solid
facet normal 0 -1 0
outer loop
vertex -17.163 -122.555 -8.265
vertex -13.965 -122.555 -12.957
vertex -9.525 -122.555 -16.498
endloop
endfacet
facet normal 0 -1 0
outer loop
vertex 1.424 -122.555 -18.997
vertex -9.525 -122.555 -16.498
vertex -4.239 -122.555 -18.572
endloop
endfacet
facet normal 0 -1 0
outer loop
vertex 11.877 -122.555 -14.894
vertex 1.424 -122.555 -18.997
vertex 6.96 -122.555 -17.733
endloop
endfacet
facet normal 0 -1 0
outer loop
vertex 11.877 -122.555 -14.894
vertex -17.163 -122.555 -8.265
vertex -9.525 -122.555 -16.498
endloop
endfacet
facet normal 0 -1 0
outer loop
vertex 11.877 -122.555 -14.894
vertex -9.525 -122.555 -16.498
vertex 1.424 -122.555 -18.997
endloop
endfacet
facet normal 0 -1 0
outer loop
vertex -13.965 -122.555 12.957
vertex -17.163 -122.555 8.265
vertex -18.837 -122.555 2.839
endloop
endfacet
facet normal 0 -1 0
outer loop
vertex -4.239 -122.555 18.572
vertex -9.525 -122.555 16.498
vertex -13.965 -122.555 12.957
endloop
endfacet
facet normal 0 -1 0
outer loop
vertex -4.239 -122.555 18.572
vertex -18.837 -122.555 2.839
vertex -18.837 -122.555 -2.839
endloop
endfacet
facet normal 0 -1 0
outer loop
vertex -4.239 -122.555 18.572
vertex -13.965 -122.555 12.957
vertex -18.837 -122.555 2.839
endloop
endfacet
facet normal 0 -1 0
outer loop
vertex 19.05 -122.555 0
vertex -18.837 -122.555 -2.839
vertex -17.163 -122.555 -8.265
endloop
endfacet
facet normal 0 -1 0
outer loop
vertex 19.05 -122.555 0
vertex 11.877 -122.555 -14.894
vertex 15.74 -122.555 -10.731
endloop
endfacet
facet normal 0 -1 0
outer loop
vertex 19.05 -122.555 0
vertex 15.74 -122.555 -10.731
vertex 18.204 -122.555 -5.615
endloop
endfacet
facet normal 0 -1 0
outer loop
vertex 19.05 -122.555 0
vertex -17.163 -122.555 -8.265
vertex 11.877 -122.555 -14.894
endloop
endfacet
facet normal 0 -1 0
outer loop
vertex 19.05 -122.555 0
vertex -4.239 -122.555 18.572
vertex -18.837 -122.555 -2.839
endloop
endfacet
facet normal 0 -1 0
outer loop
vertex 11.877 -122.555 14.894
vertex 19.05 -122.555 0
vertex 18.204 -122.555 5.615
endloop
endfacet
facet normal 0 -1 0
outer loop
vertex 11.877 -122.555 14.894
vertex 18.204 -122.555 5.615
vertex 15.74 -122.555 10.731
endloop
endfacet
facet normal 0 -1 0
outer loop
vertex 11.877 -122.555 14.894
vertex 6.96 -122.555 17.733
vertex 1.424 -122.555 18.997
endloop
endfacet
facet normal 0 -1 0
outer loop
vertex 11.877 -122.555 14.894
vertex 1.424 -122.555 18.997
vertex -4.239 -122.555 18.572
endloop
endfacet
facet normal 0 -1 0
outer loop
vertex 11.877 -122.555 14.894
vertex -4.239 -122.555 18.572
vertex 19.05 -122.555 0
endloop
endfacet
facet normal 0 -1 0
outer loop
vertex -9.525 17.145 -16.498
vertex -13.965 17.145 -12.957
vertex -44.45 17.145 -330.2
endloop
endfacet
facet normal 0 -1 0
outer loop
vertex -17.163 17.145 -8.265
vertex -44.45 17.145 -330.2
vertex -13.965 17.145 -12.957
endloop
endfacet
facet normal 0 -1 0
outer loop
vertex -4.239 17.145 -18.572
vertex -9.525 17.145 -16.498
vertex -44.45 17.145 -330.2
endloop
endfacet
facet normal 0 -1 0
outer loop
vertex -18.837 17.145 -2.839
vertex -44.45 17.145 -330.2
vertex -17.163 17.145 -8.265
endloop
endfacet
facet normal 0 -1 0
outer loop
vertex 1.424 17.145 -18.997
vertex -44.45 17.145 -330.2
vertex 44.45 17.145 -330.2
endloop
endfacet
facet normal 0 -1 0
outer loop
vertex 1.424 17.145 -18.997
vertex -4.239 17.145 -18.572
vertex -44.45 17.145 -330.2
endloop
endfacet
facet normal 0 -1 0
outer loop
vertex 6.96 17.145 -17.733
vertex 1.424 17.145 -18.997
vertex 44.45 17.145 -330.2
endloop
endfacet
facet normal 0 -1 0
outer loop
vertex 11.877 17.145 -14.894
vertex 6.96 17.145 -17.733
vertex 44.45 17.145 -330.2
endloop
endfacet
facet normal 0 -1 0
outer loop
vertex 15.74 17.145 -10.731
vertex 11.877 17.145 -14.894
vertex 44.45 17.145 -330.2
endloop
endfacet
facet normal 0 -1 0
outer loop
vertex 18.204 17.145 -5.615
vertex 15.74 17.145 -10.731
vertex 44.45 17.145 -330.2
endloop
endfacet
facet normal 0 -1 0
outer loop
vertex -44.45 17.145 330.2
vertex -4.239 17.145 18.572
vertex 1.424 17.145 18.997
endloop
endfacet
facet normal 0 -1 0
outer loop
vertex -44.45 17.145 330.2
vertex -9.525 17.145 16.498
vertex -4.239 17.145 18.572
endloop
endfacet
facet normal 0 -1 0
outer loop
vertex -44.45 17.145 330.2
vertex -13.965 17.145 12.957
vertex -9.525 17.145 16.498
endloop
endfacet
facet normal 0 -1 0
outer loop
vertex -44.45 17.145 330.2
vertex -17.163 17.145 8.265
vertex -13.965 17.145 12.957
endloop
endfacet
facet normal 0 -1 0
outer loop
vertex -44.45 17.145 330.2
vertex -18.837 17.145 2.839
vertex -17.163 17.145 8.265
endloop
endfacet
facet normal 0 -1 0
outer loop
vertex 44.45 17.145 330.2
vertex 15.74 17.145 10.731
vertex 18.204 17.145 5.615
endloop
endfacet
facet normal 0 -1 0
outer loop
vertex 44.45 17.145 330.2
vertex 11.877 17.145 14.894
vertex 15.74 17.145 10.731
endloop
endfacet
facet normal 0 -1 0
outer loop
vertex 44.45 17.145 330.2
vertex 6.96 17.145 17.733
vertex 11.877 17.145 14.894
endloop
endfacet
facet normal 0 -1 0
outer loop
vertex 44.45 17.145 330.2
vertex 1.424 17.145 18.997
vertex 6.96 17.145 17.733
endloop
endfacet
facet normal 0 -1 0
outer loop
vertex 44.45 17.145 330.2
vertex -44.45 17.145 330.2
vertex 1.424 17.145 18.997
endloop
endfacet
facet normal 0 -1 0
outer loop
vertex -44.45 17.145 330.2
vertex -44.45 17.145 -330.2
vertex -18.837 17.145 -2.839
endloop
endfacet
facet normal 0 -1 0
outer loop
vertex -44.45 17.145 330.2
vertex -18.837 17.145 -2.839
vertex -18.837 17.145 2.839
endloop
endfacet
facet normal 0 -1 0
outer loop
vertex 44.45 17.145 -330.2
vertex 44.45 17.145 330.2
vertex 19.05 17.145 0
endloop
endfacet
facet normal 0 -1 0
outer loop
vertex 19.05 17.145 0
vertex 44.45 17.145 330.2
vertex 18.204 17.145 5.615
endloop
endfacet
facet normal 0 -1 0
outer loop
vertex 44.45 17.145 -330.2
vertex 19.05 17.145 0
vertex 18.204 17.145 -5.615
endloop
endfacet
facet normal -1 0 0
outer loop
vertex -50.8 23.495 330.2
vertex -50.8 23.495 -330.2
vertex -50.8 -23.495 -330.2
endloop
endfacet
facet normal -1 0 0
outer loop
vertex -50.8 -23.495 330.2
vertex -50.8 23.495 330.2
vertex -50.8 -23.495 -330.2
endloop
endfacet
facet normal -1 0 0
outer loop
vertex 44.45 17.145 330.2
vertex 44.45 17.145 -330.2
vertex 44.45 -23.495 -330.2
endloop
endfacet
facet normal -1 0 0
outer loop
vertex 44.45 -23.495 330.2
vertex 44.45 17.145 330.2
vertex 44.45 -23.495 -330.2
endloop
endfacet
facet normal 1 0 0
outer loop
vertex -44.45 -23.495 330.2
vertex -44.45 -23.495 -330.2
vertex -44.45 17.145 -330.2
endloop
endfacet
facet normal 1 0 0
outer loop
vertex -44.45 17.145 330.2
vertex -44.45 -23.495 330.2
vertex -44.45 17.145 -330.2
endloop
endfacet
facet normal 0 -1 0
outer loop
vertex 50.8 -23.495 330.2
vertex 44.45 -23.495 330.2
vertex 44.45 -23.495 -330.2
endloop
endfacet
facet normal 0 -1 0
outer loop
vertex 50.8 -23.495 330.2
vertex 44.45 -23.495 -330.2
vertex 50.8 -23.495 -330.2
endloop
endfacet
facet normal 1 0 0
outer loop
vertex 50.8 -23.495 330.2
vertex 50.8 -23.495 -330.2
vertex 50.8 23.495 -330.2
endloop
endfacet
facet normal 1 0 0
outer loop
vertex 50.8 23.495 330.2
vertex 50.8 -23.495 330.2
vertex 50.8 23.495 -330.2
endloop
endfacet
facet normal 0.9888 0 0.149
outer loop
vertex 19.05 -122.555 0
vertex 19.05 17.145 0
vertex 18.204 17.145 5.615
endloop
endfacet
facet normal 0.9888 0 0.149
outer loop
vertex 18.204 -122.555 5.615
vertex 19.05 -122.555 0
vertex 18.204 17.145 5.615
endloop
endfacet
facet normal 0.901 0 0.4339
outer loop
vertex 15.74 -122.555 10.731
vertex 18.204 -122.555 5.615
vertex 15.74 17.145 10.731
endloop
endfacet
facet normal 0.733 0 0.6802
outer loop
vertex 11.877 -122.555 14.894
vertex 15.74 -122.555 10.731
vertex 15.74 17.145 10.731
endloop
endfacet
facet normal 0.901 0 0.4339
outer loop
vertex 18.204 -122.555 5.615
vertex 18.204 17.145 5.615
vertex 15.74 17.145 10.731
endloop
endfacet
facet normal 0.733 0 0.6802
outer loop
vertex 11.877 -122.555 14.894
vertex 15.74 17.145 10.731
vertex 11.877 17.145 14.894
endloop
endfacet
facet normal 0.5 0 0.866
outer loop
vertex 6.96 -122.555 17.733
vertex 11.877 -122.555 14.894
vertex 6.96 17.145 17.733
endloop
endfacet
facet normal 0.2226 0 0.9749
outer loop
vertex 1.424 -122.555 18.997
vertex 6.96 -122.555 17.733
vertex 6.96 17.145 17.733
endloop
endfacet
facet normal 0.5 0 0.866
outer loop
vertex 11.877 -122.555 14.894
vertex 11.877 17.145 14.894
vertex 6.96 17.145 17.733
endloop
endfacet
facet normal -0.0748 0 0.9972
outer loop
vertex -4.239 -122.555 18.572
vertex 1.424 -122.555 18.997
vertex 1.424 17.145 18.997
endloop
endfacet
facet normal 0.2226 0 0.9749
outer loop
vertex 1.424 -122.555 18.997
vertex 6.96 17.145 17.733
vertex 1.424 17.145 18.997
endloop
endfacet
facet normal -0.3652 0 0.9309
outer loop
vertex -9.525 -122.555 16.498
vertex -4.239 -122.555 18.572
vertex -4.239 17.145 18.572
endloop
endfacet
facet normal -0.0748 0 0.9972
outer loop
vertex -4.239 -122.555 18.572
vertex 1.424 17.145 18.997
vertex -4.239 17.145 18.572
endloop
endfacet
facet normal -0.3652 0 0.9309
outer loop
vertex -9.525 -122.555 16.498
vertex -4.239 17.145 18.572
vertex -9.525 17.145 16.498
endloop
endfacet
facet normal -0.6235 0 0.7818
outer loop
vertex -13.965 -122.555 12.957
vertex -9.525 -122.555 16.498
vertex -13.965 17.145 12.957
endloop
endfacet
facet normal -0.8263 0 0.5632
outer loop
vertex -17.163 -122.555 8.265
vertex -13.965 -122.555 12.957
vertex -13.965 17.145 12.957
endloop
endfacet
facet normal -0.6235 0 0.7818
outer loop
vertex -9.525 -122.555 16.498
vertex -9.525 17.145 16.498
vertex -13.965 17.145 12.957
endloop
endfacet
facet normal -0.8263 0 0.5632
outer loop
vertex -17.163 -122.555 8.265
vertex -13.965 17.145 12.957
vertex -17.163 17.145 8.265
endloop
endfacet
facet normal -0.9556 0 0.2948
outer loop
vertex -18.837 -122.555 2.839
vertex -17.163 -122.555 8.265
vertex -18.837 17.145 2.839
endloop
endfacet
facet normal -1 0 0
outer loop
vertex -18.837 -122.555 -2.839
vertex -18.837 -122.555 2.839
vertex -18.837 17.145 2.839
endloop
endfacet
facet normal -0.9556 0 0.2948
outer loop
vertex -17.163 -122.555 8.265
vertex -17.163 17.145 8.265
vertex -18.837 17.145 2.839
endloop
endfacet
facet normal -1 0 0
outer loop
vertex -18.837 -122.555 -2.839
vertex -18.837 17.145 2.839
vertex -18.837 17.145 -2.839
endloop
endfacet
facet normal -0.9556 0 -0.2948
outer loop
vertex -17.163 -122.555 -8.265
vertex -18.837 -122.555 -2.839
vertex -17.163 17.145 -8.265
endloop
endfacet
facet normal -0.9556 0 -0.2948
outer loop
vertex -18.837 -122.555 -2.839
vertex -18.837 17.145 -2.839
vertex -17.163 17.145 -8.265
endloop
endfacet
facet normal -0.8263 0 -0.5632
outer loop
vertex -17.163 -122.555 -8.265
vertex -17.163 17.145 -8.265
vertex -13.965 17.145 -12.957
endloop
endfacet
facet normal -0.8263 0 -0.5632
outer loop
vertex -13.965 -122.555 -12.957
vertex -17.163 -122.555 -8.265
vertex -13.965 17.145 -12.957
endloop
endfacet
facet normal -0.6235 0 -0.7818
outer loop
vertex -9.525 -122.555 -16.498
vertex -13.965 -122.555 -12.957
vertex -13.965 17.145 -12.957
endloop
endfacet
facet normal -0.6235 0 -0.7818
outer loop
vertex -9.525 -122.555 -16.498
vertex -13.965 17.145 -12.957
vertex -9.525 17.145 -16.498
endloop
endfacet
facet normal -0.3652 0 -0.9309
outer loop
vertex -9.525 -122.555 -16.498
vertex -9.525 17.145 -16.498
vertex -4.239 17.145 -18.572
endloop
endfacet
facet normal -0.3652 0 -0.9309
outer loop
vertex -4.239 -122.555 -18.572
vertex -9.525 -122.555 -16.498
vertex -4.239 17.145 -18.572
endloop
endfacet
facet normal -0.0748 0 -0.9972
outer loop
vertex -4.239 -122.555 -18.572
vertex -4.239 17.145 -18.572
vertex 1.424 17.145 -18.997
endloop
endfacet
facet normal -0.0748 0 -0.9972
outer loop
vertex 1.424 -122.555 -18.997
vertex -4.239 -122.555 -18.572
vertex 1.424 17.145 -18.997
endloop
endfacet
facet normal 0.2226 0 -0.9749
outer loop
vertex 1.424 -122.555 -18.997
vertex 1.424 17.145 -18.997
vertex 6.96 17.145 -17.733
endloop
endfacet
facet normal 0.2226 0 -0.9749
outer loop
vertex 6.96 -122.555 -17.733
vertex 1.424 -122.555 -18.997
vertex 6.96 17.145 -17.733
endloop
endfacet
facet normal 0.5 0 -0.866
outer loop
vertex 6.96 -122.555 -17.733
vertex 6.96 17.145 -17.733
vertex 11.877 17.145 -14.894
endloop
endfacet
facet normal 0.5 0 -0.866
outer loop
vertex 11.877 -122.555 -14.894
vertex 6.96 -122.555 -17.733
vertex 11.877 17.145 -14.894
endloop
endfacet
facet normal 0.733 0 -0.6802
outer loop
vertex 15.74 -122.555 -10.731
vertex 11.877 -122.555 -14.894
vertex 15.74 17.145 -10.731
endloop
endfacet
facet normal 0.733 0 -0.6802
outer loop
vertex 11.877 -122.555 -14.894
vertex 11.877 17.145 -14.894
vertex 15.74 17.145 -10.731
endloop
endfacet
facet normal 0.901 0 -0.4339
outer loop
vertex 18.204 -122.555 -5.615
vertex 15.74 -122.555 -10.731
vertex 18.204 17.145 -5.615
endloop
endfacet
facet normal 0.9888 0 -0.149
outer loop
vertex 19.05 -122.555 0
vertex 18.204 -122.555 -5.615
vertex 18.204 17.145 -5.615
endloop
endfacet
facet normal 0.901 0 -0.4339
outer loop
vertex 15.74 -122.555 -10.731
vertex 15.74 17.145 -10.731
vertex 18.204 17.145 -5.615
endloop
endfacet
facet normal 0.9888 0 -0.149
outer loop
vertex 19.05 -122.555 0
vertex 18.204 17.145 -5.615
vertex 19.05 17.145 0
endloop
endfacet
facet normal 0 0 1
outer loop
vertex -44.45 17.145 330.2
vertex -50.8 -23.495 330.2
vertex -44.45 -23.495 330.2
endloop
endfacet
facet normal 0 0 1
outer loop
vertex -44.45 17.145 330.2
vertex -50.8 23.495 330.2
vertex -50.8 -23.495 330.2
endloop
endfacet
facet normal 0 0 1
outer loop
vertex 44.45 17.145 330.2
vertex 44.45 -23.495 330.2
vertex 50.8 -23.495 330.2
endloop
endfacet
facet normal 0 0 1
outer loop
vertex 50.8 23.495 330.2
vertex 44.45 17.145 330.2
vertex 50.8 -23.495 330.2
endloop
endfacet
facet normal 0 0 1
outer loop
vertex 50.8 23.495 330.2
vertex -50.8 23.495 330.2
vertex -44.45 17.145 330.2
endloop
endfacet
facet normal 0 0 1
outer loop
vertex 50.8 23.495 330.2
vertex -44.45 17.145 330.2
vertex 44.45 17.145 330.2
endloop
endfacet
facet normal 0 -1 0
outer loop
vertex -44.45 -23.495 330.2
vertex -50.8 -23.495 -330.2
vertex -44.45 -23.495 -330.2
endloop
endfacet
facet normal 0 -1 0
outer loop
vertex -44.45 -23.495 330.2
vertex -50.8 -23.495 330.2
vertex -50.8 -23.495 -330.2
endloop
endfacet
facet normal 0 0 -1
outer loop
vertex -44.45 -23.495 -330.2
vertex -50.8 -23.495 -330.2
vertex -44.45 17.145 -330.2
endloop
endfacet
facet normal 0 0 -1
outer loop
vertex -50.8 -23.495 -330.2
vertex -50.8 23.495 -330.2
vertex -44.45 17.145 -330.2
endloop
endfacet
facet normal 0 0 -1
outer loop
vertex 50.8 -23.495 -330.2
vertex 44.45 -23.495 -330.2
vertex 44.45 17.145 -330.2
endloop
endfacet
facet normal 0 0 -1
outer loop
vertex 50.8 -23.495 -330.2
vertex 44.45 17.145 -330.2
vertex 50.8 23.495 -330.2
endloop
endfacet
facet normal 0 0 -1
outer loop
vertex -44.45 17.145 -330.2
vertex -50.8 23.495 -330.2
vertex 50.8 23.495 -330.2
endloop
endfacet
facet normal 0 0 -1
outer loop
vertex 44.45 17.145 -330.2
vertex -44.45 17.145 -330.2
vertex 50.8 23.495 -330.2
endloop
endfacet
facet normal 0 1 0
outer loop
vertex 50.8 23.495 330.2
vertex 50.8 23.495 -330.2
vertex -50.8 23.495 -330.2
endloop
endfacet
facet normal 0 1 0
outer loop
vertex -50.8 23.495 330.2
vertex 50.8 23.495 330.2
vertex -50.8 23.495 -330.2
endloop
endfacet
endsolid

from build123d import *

# Parameters (mm, degrees)
BOSS_EXTRUDE1_DEPTH = 330.2
SKETCH2_R           = 19.05
BOSS_EXTRUDE2_DEPTH = 139.7


with BuildPart() as part:
    # Sketch1 → Boss-Extrude1 (new body, symmetric)
    with BuildSketch(Plane.XY):
        Polygon((-50.8, -23.495), (-44.45, -23.495), (-44.45, 17.145), (44.45, 17.145), (44.45, -23.495), (50.8, -23.495), (50.8, 23.495), (-50.8, 23.495), align=None)
    extrude(amount=BOSS_EXTRUDE1_DEPTH, both=True)

    # Sketch2 → Boss-Extrude2 (add)
    with BuildSketch(Plane.XZ.offset(-17.145)):
        Circle(SKETCH2_R)
    extrude(amount=BOSS_EXTRUDE2_DEPTH)


solid = part.part
